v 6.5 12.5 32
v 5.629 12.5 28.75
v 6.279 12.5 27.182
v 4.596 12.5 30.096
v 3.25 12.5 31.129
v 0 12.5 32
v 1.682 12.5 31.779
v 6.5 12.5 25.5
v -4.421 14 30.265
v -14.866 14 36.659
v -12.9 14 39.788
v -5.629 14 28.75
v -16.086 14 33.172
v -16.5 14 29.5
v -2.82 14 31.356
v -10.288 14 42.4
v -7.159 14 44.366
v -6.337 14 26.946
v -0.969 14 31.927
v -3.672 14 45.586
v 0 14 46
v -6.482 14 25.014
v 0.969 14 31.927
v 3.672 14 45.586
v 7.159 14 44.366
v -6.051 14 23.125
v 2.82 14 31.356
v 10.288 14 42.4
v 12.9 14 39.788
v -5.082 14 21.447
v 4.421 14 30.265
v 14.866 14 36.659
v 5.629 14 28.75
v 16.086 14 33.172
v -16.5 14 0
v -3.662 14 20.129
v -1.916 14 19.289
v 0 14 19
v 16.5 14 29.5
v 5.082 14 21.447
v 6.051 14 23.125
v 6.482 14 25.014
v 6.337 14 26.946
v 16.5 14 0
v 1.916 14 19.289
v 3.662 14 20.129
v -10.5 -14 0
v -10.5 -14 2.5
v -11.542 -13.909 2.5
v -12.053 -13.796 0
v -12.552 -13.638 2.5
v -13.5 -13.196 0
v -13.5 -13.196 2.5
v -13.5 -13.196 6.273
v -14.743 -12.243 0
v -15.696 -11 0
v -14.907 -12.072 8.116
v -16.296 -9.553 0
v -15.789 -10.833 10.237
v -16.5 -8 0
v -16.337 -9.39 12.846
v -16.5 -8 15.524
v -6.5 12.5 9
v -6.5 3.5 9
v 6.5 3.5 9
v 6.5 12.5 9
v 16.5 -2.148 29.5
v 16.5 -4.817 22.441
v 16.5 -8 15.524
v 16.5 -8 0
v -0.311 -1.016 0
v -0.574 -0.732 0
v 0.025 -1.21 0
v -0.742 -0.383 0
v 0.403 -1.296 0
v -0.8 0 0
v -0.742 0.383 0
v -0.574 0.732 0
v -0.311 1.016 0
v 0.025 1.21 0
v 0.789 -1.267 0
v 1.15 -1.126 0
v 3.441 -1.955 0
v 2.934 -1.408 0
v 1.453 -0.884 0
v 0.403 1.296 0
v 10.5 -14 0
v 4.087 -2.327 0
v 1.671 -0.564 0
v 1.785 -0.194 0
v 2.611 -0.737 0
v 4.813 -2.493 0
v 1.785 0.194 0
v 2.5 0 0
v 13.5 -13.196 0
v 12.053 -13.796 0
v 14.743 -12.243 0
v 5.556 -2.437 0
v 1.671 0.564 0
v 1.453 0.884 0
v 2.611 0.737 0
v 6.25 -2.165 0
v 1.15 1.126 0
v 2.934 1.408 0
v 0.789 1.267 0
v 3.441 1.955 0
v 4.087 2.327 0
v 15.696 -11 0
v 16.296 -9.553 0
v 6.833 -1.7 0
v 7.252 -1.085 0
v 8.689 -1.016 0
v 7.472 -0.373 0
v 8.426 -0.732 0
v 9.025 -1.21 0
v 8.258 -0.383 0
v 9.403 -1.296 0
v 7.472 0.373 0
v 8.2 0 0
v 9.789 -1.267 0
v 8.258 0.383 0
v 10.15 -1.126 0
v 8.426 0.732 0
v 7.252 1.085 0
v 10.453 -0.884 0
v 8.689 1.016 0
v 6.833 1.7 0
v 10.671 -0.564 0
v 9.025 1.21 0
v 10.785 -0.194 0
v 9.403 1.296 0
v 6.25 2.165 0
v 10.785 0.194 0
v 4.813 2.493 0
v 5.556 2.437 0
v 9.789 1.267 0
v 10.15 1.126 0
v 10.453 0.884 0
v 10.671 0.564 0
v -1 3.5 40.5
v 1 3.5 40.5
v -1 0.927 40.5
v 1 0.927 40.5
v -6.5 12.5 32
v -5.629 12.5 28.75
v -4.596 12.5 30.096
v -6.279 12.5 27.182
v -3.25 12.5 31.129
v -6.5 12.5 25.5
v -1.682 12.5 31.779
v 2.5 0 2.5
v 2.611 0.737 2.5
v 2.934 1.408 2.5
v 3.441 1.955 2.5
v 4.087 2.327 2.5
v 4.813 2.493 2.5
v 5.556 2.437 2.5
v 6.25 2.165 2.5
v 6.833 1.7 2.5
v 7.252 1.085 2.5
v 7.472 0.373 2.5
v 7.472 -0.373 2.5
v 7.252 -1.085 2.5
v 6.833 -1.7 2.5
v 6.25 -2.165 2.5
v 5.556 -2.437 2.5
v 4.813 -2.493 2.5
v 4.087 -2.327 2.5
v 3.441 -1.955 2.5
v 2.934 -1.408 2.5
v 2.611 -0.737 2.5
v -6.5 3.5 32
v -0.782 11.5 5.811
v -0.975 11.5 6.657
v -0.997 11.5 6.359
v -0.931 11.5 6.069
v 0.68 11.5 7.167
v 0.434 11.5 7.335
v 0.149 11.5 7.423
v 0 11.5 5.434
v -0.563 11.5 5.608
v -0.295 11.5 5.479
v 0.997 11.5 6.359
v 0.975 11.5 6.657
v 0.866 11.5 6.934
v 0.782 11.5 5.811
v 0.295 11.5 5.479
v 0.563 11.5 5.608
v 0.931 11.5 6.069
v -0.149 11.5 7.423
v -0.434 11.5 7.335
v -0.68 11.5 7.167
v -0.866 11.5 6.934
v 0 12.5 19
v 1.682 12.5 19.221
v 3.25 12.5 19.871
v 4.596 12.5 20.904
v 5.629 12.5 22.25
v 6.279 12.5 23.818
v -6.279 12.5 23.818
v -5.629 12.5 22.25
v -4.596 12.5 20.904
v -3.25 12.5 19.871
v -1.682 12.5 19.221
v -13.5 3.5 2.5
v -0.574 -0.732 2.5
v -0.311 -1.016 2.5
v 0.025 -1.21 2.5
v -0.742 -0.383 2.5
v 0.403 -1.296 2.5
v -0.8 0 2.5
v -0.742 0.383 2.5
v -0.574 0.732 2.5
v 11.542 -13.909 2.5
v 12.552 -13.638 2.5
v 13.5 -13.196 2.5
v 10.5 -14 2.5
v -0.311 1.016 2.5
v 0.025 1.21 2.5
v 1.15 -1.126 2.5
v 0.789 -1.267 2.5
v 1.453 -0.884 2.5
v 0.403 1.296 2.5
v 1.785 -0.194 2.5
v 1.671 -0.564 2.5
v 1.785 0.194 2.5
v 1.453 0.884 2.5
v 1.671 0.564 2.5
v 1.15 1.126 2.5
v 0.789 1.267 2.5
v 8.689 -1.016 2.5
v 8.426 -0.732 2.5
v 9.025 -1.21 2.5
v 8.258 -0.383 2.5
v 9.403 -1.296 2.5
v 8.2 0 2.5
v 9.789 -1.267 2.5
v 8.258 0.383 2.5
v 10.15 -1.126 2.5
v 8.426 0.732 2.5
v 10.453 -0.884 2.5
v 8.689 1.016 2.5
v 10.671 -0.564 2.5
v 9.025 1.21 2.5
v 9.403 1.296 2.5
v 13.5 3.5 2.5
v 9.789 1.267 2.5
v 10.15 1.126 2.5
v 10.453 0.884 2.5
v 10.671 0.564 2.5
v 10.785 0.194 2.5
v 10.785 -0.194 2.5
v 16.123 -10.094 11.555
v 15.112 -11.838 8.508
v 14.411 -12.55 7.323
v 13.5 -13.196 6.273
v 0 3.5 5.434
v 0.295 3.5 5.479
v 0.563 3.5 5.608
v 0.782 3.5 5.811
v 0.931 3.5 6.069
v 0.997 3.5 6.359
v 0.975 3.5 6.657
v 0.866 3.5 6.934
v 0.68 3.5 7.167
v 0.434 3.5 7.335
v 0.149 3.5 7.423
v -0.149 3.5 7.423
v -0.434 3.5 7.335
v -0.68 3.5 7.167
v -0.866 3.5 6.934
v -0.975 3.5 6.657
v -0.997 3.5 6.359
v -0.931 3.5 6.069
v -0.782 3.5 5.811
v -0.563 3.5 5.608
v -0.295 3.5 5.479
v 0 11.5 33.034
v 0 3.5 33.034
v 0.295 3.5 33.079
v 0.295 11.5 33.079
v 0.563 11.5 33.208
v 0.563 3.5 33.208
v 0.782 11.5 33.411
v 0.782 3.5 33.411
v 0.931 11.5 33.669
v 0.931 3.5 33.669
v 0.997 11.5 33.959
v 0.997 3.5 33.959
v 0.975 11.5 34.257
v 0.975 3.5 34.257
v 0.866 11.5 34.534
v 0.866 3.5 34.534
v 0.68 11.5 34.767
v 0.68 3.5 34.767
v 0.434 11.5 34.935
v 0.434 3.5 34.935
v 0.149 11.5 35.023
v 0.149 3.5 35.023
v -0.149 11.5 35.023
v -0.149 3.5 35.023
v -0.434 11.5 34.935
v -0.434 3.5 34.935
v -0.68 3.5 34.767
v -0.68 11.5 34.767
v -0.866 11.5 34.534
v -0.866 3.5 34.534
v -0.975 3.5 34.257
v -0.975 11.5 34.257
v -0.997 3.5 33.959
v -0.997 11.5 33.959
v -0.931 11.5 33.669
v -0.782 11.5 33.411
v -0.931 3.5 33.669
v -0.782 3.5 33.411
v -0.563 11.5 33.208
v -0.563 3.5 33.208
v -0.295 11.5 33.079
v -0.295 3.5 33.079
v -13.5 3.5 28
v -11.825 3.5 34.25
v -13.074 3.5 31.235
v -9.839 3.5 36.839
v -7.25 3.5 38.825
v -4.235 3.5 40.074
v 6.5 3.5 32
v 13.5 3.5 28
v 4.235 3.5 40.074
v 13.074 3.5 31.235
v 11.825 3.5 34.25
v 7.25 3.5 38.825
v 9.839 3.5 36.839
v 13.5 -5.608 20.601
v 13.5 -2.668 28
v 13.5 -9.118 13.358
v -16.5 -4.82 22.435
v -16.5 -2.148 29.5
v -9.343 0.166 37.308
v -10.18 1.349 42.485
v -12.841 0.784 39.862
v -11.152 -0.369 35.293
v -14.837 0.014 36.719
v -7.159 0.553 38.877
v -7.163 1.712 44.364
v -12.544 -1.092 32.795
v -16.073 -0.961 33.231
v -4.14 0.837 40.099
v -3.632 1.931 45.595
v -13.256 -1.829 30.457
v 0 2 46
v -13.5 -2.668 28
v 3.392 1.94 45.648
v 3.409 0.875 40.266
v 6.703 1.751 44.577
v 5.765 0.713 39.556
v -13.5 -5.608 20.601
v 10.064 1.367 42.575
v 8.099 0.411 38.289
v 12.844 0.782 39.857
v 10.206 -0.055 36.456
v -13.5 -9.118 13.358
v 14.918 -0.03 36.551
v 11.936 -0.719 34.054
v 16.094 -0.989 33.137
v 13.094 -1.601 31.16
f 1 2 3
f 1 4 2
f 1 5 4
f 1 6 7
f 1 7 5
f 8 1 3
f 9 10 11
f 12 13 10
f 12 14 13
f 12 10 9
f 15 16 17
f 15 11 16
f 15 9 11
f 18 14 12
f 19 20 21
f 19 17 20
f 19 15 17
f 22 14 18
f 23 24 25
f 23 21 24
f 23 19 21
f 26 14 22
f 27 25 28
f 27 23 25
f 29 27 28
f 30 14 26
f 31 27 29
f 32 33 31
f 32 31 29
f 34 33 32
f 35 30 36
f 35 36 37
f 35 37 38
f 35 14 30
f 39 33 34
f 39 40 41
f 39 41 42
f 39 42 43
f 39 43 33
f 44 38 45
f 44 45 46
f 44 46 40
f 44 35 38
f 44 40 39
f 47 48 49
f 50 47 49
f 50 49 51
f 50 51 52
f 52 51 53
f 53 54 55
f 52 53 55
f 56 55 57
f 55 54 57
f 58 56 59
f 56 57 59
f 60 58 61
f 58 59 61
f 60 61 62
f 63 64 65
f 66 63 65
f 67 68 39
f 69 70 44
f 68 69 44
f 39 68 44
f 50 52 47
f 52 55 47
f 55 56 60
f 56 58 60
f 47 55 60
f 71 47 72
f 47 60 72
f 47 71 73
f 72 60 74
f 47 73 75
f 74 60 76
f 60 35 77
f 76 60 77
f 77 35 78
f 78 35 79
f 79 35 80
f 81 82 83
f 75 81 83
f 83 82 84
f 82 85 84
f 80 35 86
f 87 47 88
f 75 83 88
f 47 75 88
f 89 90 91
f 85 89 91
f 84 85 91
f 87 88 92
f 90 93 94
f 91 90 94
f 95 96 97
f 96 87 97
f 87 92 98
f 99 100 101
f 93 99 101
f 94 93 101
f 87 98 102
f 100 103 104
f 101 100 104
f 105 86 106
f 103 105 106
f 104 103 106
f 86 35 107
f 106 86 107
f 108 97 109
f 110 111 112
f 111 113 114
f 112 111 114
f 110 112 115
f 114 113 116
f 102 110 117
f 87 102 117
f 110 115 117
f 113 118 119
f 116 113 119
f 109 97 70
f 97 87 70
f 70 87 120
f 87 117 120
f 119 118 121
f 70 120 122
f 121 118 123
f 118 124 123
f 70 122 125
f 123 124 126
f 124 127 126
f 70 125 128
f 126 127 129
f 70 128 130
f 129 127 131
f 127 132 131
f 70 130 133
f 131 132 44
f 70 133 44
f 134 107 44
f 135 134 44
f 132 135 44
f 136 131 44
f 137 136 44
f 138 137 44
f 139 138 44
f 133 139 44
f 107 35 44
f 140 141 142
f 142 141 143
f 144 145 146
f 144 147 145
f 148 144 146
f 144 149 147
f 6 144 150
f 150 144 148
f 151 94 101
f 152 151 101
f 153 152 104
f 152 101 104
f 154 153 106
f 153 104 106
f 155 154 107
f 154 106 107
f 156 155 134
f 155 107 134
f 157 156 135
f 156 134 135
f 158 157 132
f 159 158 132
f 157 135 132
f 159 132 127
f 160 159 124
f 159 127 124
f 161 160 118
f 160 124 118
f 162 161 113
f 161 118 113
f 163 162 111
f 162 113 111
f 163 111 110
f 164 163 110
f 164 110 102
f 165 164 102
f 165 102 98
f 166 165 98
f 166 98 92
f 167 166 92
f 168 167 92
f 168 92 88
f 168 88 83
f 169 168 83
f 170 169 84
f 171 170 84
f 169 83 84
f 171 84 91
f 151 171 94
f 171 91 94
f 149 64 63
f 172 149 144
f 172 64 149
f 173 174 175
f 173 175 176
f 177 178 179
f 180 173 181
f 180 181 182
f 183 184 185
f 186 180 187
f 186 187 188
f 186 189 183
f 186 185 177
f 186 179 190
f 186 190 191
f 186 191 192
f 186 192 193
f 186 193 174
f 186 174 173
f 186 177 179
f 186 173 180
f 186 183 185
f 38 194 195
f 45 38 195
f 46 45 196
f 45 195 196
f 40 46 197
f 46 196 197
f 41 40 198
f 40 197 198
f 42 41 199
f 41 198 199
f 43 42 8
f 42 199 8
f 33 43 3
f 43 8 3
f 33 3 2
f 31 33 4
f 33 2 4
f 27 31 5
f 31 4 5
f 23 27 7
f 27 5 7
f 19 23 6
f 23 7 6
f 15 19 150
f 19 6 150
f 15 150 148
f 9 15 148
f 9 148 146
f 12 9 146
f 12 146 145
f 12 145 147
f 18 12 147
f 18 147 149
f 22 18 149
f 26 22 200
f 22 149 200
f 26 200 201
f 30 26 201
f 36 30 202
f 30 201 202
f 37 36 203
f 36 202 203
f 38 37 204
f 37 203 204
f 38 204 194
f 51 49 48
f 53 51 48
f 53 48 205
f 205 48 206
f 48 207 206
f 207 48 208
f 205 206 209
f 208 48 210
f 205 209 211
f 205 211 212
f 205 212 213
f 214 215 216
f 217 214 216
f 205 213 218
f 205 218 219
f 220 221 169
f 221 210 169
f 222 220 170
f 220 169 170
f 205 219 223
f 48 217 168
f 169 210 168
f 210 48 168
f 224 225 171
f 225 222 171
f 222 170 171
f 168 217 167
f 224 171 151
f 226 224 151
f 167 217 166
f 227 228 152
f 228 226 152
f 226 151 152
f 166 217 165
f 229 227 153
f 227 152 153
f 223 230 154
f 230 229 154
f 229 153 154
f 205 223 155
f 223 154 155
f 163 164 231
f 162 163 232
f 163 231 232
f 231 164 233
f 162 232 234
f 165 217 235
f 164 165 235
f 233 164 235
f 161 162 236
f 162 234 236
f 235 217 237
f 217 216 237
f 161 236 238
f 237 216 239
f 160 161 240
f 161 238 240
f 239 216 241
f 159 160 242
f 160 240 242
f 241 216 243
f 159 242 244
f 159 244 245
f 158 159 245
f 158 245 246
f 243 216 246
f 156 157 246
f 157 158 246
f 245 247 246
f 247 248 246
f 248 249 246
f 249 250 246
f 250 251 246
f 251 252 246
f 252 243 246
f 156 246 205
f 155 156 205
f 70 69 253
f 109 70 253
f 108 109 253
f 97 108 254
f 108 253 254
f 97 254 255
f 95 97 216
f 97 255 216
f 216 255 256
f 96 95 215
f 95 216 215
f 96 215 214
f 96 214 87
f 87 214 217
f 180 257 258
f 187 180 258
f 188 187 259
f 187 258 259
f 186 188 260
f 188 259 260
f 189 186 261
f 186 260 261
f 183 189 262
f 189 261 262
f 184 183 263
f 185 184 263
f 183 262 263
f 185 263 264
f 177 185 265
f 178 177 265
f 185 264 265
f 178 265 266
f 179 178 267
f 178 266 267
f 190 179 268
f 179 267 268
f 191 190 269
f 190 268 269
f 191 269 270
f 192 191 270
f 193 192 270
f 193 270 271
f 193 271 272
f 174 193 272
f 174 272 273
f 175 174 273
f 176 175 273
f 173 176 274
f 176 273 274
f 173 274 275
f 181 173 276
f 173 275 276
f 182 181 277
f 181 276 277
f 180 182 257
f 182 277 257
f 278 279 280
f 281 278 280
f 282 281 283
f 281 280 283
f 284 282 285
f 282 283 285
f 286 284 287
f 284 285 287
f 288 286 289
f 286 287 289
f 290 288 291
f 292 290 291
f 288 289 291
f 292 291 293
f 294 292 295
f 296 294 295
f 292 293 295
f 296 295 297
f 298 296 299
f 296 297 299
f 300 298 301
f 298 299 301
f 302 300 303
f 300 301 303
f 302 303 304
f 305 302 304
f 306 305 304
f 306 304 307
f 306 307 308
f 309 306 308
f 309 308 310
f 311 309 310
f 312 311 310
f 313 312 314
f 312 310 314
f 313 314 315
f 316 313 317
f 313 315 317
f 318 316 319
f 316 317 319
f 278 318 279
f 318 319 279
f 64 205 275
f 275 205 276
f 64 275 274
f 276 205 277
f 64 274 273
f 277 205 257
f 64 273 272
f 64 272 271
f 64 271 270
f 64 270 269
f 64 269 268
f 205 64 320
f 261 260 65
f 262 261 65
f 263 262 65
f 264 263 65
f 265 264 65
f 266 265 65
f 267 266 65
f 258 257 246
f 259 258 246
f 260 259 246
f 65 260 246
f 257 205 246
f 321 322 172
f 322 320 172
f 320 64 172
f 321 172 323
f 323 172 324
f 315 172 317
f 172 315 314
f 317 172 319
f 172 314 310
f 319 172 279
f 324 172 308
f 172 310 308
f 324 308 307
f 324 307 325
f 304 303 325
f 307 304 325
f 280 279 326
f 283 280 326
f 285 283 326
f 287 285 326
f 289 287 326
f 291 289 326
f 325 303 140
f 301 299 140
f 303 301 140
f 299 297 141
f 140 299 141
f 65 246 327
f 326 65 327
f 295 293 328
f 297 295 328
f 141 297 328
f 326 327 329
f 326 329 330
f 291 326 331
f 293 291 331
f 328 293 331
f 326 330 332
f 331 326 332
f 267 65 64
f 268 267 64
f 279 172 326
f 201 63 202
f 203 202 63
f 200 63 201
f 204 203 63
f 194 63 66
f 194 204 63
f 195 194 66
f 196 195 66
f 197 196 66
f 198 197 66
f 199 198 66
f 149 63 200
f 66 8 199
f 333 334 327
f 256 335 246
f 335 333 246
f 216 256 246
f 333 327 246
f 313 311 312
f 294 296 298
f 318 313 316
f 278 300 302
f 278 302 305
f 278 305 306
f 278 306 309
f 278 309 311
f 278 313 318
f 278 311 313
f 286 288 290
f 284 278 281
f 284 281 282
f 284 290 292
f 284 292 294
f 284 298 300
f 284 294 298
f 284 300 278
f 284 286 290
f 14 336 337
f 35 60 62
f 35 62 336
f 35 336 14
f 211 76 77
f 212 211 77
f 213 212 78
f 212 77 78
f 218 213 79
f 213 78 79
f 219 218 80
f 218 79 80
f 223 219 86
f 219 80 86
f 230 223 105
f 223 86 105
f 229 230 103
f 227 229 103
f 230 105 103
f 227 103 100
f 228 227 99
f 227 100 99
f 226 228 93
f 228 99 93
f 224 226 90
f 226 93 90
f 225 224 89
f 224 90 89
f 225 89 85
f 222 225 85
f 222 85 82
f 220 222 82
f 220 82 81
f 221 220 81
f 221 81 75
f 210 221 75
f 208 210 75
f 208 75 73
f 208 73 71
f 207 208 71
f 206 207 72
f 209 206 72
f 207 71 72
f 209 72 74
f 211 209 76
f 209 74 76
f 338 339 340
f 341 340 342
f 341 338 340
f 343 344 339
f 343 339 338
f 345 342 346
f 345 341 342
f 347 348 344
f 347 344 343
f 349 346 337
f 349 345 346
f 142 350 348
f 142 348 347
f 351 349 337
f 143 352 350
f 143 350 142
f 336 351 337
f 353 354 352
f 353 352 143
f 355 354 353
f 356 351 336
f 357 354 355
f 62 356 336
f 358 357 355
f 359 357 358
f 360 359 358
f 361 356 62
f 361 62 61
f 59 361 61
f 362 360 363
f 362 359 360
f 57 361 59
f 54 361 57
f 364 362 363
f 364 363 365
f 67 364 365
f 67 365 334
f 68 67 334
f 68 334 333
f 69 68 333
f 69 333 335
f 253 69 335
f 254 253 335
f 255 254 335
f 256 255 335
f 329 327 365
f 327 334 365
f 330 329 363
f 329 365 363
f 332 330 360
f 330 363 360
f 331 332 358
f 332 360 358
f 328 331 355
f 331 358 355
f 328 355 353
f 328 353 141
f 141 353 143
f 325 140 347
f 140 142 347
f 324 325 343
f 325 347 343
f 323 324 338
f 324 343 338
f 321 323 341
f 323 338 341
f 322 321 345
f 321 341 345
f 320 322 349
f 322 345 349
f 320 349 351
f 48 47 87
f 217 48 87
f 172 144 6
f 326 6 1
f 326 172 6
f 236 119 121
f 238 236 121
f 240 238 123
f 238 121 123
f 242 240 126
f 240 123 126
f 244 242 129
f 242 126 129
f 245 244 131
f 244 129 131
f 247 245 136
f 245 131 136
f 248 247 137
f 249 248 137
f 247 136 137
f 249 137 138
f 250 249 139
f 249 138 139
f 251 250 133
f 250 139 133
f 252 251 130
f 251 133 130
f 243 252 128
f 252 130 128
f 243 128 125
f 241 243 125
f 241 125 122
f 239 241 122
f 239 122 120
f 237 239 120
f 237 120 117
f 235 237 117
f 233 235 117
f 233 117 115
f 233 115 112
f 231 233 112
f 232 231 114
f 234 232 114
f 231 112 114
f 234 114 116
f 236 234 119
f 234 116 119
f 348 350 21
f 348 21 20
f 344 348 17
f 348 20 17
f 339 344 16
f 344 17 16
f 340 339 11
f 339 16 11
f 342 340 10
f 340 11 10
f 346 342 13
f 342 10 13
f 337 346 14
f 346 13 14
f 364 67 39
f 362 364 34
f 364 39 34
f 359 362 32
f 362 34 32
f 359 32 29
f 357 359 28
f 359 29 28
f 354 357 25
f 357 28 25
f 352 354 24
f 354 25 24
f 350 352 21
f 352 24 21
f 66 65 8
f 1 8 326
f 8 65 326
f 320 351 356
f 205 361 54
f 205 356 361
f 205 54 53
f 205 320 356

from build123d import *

# Parameters (mm, degrees)
SKETCH1_W           = 33
SKETCH1_H           = 28
BOSS_EXTRUDE1_DEPTH = 46
CUT_EXTRUDE1_DEPTH  = 59.318093247
CUT_EXTRUDE2_START  = -3
CUT_EXTRUDE2_DEPTH  = 27
FILLET1_R           = 12.5
FILLET2_R           = 16.5
FILLET3_R           = 6
SKETCH4_W           = 13
SKETCH4_H           = 23
CUT_EXTRUDE3_DEPTH  = 9
SKETCH5_R           = 6.5
CUT_EXTRUDE4_DEPTH  = 56.592265809
SKETCH6_R           = 1
CUT_EXTRUDE5_DEPTH  = 8
SKETCH7_R           = 1.3
SKETCH7_R_2         = 2.5
CUT_EXTRUDE6_DEPTH  = 2.5


with BuildPart() as part:
    # Sketch1 → Boss-Extrude1 (new body)
    with BuildSketch(Plane.XY):
        Rectangle(SKETCH1_W, SKETCH1_H)
    extrude(amount=BOSS_EXTRUDE1_DEPTH)

    # Sketch2 → Cut-Extrude1 (cut, through all)
    with BuildSketch(Plane(origin=(16.5, 0, 0), x_dir=(0, 0, -1), z_dir=(1, 0, 0))):
        with BuildLine():
            Line((-5, -14), (-46, -14))
            Line((-46, -14), (-46, 2))
            add(Edge.make_bspline(
                [(-46, 2), (-24.29854511, -1.646485385), (-5, -14)],
                knots=[0, 0, 0, 1, 1, 1], degree=2))
        make_face()
    extrude(amount=-CUT_EXTRUDE1_DEPTH, mode=Mode.SUBTRACT)

    # Sketch3 → Cut-Extrude2 (cut)
    with BuildSketch(Plane(origin=(16.5, 0, 0), x_dir=(0, 0, -1), z_dir=(1, 0, 0)).offset(CUT_EXTRUDE2_START)):
        with BuildLine():
            Line((-5, -14), (-2.5, -14))
            Line((-2.5, -14), (-2.5, 3.5))
            Line((-2.5, 3.5), (-40.5, 3.5))
            Line((-40.5, 3.5), (-40.5, 0.927448298))
            add(Edge.make_bspline(
                [(-5, -14), (-21.835639292, -3.223057237), (-40.5, 0.927448298)],
                knots=[0, 0, 0, 1, 1, 1], degree=2))
        make_face()
    extrude(amount=-CUT_EXTRUDE2_DEPTH, mode=Mode.SUBTRACT)

    # Fillet1
    fillet1_edges = [part.edges().sort_by_distance(p)[0] for p in [
        (13.5, 2.213724149, 40.5),
        (-13.5, 2.213724149, 40.5),
    ]]
    fillet(fillet1_edges, radius=FILLET1_R)

    # Fillet2
    fillet2_edges = [part.edges().sort_by_distance(p)[0] for p in [
        (16.5, 8, 46),
        (-16.5, 8, 46),
    ]]
    fillet(fillet2_edges, radius=FILLET2_R - 0.0001)  # a hair under: the kernel refuses the full size

    # Fillet3
    fillet3_edges = [part.edges().sort_by_distance(p)[0] for p in [
        (16.5, -14, 2.5),
        (-16.5, -14, 2.5),
    ]]
    fillet(fillet3_edges, radius=FILLET3_R)

    # Sketch4 → Cut-Extrude3 (cut)
    with BuildSketch(Plane.XZ.offset(-3.5)):
        with Locations((0, 20.5)):
            Rectangle(SKETCH4_W, SKETCH4_H)
    extrude(amount=-CUT_EXTRUDE3_DEPTH, mode=Mode.SUBTRACT)

    # Sketch5 → Cut-Extrude4 (cut, through all)
    with BuildSketch(Plane.XZ.offset(-12.5)):
        with Locations(Location((0, 25.5, 0), (0, 0, 270))):
            Circle(SKETCH5_R)
    extrude(amount=-CUT_EXTRUDE4_DEPTH, mode=Mode.SUBTRACT)

    # Sketch6 → Cut-Extrude5 (cut)
    with BuildSketch(Plane.XZ.offset(-3.5)):
        with Locations(Location((0, 34.034163798, 0), (0, 0, 270))):
            Circle(SKETCH6_R)
        with Locations(Location((0, 6.434163798, 0), (0, 0, 270))):
            Circle(SKETCH6_R)
    extrude(amount=-CUT_EXTRUDE5_DEPTH, mode=Mode.SUBTRACT)

    # Sketch7 → Cut-Extrude6 (cut)
    with BuildSketch(Plane(origin=(0, 0, 0), x_dir=(-1, 0, 0), z_dir=(0, 0, -1))):
        with Locations((-0.5, 0)):
            Circle(SKETCH7_R)
        with Locations((-5, 0)):
            Circle(SKETCH7_R_2)
        with Locations((-9.5, 0)):
            Circle(SKETCH7_R)
    extrude(amount=-CUT_EXTRUDE6_DEPTH, mode=Mode.SUBTRACT)


solid = part.part
